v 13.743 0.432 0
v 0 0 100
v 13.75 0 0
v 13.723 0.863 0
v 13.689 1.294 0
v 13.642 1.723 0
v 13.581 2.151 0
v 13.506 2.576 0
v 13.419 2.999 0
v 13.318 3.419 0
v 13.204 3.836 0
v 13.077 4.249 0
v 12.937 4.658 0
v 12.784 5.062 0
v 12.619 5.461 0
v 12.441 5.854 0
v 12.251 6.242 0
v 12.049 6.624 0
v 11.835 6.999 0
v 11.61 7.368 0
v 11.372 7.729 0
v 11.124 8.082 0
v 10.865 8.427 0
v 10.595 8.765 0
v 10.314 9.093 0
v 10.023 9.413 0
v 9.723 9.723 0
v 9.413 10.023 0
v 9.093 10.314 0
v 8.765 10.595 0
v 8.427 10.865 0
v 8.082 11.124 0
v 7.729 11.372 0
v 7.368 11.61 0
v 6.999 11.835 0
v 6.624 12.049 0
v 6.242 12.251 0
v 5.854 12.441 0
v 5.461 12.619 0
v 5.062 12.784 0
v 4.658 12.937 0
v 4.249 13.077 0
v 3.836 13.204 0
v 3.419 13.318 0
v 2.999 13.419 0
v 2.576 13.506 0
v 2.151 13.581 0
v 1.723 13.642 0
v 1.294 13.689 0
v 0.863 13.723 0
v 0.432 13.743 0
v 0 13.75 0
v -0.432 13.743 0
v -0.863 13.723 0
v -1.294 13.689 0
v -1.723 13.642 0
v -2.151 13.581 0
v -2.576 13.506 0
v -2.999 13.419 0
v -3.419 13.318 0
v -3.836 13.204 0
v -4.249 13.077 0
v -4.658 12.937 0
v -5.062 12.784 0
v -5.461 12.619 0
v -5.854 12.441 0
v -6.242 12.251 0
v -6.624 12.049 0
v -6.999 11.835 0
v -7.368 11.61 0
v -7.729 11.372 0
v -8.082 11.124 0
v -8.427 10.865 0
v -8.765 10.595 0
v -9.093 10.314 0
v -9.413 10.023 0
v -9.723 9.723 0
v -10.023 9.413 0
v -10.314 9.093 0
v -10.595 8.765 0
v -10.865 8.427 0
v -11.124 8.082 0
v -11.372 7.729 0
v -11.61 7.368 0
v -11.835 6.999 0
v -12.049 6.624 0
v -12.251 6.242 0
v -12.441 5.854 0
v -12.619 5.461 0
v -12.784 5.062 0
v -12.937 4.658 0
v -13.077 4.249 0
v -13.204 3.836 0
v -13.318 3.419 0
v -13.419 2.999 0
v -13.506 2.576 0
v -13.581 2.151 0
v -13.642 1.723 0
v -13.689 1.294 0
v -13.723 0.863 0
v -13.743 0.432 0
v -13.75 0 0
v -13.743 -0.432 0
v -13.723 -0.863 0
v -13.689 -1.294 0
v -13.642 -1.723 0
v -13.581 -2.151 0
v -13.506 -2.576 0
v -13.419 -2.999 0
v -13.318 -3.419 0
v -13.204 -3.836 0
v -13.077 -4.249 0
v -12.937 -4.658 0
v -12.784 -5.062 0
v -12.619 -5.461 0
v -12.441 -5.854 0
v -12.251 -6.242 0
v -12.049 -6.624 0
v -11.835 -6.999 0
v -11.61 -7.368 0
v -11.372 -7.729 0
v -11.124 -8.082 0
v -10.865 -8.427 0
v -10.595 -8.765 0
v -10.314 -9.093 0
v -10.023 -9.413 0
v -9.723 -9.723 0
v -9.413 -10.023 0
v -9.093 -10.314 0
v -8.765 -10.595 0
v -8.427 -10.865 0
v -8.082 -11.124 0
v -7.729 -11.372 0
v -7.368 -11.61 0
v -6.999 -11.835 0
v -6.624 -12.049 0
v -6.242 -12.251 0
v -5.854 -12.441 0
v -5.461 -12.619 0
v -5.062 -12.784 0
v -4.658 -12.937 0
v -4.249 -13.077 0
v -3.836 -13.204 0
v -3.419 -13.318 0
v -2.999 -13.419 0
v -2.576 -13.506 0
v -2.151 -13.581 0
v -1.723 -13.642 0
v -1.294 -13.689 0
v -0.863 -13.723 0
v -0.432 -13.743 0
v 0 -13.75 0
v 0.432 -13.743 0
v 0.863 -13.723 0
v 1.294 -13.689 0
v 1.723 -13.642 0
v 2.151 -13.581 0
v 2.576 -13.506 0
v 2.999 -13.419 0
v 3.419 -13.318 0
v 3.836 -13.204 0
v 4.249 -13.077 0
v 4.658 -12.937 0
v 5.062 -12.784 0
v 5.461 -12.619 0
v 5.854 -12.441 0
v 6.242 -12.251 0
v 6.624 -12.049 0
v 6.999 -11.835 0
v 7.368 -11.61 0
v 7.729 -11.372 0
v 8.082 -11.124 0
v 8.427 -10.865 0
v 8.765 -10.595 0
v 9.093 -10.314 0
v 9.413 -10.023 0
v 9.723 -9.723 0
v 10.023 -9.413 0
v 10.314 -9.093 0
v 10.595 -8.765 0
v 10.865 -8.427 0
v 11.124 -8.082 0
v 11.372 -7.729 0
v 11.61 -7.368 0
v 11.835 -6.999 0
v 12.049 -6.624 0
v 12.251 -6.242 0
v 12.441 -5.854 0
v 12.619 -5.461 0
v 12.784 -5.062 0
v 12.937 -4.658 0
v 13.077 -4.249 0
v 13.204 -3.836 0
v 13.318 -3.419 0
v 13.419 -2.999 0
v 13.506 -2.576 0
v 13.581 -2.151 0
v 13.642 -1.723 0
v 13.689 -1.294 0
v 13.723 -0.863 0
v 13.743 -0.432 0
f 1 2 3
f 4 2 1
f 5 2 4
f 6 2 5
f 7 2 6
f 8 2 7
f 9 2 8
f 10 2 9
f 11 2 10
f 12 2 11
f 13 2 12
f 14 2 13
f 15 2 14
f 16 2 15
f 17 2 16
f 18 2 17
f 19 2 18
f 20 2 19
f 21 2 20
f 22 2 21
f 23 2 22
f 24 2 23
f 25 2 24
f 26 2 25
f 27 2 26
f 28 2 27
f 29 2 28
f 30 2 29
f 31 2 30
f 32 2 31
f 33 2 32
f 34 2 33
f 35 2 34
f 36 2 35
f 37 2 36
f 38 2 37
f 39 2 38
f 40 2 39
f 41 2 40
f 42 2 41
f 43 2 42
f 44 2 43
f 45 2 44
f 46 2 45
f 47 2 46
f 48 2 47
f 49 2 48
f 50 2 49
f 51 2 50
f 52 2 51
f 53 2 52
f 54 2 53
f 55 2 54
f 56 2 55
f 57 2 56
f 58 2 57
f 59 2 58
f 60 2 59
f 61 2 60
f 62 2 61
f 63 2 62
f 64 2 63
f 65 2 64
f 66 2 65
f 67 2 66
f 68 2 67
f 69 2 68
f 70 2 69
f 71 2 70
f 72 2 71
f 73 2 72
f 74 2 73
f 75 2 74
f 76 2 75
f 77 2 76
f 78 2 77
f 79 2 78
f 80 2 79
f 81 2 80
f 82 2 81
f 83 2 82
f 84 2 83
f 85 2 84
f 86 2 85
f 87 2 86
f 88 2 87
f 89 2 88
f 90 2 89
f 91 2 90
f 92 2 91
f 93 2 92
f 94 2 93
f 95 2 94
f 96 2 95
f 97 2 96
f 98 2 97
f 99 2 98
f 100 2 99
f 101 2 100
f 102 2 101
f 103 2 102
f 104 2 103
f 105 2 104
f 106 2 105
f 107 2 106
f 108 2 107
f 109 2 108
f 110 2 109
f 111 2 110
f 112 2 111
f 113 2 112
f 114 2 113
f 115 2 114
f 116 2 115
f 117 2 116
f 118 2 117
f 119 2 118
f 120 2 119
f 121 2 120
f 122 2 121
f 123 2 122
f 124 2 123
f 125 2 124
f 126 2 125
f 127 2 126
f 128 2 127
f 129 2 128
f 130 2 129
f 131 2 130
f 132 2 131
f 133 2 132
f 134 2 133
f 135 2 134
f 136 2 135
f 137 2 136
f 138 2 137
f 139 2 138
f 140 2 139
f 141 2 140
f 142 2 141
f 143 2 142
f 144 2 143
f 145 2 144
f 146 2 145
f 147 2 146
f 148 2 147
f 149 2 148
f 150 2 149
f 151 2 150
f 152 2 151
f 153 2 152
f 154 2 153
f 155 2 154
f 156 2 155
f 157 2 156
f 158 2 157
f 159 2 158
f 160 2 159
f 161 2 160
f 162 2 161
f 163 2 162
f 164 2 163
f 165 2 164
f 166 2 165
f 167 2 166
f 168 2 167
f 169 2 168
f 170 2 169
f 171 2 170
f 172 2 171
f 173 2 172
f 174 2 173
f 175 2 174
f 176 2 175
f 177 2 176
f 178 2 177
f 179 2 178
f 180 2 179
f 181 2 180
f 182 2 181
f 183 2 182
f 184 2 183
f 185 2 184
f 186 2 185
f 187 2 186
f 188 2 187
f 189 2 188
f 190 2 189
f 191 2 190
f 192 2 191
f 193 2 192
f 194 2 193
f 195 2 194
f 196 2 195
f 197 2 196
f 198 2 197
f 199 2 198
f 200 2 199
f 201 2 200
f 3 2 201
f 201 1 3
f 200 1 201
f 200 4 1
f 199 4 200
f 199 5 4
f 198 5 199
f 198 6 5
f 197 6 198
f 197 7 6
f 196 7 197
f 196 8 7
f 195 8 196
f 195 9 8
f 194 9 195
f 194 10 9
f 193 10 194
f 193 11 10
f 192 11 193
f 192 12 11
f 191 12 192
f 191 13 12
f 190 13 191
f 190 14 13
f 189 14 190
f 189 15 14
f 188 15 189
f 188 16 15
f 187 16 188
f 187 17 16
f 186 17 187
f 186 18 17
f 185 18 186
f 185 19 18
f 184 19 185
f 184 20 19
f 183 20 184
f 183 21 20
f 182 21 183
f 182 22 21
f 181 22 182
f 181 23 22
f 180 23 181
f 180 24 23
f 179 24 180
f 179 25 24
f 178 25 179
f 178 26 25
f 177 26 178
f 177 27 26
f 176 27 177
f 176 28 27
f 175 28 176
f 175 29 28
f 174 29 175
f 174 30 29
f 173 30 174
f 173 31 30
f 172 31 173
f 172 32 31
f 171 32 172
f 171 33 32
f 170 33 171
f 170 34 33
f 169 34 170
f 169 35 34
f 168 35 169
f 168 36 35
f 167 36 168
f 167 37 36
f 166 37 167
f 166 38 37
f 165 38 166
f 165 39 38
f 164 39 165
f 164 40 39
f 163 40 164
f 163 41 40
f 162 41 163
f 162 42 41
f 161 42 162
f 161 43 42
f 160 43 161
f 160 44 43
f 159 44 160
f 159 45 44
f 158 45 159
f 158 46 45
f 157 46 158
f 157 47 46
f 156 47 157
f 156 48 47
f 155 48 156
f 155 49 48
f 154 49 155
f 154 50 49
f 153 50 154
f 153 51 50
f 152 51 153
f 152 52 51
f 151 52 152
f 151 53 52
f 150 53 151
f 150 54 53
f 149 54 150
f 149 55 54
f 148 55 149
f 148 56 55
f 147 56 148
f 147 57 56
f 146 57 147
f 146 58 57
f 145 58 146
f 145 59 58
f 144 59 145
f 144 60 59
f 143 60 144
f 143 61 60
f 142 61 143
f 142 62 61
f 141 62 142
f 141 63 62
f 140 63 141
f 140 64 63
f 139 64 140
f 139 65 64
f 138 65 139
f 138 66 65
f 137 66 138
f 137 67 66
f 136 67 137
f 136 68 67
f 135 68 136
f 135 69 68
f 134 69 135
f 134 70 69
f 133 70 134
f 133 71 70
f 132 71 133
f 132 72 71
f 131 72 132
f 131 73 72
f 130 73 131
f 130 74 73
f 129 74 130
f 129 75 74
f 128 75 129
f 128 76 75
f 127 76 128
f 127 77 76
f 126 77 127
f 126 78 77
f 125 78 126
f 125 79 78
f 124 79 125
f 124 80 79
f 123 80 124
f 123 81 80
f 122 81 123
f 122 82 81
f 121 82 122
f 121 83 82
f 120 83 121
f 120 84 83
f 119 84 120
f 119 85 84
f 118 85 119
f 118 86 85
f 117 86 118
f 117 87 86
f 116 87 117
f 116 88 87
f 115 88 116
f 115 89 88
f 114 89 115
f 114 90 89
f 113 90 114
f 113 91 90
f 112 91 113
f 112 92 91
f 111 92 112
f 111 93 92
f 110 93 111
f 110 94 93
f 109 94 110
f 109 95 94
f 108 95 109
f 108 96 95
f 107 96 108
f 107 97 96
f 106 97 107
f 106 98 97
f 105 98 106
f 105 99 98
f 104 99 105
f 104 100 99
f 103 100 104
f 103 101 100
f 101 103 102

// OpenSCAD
wall=.4;
$fn=200;
difference(){
    cylinder(h=100, d1=27.5,d2=0);
    //cylinder(h=100-wall, d1=28-wall,d2=0);
}
